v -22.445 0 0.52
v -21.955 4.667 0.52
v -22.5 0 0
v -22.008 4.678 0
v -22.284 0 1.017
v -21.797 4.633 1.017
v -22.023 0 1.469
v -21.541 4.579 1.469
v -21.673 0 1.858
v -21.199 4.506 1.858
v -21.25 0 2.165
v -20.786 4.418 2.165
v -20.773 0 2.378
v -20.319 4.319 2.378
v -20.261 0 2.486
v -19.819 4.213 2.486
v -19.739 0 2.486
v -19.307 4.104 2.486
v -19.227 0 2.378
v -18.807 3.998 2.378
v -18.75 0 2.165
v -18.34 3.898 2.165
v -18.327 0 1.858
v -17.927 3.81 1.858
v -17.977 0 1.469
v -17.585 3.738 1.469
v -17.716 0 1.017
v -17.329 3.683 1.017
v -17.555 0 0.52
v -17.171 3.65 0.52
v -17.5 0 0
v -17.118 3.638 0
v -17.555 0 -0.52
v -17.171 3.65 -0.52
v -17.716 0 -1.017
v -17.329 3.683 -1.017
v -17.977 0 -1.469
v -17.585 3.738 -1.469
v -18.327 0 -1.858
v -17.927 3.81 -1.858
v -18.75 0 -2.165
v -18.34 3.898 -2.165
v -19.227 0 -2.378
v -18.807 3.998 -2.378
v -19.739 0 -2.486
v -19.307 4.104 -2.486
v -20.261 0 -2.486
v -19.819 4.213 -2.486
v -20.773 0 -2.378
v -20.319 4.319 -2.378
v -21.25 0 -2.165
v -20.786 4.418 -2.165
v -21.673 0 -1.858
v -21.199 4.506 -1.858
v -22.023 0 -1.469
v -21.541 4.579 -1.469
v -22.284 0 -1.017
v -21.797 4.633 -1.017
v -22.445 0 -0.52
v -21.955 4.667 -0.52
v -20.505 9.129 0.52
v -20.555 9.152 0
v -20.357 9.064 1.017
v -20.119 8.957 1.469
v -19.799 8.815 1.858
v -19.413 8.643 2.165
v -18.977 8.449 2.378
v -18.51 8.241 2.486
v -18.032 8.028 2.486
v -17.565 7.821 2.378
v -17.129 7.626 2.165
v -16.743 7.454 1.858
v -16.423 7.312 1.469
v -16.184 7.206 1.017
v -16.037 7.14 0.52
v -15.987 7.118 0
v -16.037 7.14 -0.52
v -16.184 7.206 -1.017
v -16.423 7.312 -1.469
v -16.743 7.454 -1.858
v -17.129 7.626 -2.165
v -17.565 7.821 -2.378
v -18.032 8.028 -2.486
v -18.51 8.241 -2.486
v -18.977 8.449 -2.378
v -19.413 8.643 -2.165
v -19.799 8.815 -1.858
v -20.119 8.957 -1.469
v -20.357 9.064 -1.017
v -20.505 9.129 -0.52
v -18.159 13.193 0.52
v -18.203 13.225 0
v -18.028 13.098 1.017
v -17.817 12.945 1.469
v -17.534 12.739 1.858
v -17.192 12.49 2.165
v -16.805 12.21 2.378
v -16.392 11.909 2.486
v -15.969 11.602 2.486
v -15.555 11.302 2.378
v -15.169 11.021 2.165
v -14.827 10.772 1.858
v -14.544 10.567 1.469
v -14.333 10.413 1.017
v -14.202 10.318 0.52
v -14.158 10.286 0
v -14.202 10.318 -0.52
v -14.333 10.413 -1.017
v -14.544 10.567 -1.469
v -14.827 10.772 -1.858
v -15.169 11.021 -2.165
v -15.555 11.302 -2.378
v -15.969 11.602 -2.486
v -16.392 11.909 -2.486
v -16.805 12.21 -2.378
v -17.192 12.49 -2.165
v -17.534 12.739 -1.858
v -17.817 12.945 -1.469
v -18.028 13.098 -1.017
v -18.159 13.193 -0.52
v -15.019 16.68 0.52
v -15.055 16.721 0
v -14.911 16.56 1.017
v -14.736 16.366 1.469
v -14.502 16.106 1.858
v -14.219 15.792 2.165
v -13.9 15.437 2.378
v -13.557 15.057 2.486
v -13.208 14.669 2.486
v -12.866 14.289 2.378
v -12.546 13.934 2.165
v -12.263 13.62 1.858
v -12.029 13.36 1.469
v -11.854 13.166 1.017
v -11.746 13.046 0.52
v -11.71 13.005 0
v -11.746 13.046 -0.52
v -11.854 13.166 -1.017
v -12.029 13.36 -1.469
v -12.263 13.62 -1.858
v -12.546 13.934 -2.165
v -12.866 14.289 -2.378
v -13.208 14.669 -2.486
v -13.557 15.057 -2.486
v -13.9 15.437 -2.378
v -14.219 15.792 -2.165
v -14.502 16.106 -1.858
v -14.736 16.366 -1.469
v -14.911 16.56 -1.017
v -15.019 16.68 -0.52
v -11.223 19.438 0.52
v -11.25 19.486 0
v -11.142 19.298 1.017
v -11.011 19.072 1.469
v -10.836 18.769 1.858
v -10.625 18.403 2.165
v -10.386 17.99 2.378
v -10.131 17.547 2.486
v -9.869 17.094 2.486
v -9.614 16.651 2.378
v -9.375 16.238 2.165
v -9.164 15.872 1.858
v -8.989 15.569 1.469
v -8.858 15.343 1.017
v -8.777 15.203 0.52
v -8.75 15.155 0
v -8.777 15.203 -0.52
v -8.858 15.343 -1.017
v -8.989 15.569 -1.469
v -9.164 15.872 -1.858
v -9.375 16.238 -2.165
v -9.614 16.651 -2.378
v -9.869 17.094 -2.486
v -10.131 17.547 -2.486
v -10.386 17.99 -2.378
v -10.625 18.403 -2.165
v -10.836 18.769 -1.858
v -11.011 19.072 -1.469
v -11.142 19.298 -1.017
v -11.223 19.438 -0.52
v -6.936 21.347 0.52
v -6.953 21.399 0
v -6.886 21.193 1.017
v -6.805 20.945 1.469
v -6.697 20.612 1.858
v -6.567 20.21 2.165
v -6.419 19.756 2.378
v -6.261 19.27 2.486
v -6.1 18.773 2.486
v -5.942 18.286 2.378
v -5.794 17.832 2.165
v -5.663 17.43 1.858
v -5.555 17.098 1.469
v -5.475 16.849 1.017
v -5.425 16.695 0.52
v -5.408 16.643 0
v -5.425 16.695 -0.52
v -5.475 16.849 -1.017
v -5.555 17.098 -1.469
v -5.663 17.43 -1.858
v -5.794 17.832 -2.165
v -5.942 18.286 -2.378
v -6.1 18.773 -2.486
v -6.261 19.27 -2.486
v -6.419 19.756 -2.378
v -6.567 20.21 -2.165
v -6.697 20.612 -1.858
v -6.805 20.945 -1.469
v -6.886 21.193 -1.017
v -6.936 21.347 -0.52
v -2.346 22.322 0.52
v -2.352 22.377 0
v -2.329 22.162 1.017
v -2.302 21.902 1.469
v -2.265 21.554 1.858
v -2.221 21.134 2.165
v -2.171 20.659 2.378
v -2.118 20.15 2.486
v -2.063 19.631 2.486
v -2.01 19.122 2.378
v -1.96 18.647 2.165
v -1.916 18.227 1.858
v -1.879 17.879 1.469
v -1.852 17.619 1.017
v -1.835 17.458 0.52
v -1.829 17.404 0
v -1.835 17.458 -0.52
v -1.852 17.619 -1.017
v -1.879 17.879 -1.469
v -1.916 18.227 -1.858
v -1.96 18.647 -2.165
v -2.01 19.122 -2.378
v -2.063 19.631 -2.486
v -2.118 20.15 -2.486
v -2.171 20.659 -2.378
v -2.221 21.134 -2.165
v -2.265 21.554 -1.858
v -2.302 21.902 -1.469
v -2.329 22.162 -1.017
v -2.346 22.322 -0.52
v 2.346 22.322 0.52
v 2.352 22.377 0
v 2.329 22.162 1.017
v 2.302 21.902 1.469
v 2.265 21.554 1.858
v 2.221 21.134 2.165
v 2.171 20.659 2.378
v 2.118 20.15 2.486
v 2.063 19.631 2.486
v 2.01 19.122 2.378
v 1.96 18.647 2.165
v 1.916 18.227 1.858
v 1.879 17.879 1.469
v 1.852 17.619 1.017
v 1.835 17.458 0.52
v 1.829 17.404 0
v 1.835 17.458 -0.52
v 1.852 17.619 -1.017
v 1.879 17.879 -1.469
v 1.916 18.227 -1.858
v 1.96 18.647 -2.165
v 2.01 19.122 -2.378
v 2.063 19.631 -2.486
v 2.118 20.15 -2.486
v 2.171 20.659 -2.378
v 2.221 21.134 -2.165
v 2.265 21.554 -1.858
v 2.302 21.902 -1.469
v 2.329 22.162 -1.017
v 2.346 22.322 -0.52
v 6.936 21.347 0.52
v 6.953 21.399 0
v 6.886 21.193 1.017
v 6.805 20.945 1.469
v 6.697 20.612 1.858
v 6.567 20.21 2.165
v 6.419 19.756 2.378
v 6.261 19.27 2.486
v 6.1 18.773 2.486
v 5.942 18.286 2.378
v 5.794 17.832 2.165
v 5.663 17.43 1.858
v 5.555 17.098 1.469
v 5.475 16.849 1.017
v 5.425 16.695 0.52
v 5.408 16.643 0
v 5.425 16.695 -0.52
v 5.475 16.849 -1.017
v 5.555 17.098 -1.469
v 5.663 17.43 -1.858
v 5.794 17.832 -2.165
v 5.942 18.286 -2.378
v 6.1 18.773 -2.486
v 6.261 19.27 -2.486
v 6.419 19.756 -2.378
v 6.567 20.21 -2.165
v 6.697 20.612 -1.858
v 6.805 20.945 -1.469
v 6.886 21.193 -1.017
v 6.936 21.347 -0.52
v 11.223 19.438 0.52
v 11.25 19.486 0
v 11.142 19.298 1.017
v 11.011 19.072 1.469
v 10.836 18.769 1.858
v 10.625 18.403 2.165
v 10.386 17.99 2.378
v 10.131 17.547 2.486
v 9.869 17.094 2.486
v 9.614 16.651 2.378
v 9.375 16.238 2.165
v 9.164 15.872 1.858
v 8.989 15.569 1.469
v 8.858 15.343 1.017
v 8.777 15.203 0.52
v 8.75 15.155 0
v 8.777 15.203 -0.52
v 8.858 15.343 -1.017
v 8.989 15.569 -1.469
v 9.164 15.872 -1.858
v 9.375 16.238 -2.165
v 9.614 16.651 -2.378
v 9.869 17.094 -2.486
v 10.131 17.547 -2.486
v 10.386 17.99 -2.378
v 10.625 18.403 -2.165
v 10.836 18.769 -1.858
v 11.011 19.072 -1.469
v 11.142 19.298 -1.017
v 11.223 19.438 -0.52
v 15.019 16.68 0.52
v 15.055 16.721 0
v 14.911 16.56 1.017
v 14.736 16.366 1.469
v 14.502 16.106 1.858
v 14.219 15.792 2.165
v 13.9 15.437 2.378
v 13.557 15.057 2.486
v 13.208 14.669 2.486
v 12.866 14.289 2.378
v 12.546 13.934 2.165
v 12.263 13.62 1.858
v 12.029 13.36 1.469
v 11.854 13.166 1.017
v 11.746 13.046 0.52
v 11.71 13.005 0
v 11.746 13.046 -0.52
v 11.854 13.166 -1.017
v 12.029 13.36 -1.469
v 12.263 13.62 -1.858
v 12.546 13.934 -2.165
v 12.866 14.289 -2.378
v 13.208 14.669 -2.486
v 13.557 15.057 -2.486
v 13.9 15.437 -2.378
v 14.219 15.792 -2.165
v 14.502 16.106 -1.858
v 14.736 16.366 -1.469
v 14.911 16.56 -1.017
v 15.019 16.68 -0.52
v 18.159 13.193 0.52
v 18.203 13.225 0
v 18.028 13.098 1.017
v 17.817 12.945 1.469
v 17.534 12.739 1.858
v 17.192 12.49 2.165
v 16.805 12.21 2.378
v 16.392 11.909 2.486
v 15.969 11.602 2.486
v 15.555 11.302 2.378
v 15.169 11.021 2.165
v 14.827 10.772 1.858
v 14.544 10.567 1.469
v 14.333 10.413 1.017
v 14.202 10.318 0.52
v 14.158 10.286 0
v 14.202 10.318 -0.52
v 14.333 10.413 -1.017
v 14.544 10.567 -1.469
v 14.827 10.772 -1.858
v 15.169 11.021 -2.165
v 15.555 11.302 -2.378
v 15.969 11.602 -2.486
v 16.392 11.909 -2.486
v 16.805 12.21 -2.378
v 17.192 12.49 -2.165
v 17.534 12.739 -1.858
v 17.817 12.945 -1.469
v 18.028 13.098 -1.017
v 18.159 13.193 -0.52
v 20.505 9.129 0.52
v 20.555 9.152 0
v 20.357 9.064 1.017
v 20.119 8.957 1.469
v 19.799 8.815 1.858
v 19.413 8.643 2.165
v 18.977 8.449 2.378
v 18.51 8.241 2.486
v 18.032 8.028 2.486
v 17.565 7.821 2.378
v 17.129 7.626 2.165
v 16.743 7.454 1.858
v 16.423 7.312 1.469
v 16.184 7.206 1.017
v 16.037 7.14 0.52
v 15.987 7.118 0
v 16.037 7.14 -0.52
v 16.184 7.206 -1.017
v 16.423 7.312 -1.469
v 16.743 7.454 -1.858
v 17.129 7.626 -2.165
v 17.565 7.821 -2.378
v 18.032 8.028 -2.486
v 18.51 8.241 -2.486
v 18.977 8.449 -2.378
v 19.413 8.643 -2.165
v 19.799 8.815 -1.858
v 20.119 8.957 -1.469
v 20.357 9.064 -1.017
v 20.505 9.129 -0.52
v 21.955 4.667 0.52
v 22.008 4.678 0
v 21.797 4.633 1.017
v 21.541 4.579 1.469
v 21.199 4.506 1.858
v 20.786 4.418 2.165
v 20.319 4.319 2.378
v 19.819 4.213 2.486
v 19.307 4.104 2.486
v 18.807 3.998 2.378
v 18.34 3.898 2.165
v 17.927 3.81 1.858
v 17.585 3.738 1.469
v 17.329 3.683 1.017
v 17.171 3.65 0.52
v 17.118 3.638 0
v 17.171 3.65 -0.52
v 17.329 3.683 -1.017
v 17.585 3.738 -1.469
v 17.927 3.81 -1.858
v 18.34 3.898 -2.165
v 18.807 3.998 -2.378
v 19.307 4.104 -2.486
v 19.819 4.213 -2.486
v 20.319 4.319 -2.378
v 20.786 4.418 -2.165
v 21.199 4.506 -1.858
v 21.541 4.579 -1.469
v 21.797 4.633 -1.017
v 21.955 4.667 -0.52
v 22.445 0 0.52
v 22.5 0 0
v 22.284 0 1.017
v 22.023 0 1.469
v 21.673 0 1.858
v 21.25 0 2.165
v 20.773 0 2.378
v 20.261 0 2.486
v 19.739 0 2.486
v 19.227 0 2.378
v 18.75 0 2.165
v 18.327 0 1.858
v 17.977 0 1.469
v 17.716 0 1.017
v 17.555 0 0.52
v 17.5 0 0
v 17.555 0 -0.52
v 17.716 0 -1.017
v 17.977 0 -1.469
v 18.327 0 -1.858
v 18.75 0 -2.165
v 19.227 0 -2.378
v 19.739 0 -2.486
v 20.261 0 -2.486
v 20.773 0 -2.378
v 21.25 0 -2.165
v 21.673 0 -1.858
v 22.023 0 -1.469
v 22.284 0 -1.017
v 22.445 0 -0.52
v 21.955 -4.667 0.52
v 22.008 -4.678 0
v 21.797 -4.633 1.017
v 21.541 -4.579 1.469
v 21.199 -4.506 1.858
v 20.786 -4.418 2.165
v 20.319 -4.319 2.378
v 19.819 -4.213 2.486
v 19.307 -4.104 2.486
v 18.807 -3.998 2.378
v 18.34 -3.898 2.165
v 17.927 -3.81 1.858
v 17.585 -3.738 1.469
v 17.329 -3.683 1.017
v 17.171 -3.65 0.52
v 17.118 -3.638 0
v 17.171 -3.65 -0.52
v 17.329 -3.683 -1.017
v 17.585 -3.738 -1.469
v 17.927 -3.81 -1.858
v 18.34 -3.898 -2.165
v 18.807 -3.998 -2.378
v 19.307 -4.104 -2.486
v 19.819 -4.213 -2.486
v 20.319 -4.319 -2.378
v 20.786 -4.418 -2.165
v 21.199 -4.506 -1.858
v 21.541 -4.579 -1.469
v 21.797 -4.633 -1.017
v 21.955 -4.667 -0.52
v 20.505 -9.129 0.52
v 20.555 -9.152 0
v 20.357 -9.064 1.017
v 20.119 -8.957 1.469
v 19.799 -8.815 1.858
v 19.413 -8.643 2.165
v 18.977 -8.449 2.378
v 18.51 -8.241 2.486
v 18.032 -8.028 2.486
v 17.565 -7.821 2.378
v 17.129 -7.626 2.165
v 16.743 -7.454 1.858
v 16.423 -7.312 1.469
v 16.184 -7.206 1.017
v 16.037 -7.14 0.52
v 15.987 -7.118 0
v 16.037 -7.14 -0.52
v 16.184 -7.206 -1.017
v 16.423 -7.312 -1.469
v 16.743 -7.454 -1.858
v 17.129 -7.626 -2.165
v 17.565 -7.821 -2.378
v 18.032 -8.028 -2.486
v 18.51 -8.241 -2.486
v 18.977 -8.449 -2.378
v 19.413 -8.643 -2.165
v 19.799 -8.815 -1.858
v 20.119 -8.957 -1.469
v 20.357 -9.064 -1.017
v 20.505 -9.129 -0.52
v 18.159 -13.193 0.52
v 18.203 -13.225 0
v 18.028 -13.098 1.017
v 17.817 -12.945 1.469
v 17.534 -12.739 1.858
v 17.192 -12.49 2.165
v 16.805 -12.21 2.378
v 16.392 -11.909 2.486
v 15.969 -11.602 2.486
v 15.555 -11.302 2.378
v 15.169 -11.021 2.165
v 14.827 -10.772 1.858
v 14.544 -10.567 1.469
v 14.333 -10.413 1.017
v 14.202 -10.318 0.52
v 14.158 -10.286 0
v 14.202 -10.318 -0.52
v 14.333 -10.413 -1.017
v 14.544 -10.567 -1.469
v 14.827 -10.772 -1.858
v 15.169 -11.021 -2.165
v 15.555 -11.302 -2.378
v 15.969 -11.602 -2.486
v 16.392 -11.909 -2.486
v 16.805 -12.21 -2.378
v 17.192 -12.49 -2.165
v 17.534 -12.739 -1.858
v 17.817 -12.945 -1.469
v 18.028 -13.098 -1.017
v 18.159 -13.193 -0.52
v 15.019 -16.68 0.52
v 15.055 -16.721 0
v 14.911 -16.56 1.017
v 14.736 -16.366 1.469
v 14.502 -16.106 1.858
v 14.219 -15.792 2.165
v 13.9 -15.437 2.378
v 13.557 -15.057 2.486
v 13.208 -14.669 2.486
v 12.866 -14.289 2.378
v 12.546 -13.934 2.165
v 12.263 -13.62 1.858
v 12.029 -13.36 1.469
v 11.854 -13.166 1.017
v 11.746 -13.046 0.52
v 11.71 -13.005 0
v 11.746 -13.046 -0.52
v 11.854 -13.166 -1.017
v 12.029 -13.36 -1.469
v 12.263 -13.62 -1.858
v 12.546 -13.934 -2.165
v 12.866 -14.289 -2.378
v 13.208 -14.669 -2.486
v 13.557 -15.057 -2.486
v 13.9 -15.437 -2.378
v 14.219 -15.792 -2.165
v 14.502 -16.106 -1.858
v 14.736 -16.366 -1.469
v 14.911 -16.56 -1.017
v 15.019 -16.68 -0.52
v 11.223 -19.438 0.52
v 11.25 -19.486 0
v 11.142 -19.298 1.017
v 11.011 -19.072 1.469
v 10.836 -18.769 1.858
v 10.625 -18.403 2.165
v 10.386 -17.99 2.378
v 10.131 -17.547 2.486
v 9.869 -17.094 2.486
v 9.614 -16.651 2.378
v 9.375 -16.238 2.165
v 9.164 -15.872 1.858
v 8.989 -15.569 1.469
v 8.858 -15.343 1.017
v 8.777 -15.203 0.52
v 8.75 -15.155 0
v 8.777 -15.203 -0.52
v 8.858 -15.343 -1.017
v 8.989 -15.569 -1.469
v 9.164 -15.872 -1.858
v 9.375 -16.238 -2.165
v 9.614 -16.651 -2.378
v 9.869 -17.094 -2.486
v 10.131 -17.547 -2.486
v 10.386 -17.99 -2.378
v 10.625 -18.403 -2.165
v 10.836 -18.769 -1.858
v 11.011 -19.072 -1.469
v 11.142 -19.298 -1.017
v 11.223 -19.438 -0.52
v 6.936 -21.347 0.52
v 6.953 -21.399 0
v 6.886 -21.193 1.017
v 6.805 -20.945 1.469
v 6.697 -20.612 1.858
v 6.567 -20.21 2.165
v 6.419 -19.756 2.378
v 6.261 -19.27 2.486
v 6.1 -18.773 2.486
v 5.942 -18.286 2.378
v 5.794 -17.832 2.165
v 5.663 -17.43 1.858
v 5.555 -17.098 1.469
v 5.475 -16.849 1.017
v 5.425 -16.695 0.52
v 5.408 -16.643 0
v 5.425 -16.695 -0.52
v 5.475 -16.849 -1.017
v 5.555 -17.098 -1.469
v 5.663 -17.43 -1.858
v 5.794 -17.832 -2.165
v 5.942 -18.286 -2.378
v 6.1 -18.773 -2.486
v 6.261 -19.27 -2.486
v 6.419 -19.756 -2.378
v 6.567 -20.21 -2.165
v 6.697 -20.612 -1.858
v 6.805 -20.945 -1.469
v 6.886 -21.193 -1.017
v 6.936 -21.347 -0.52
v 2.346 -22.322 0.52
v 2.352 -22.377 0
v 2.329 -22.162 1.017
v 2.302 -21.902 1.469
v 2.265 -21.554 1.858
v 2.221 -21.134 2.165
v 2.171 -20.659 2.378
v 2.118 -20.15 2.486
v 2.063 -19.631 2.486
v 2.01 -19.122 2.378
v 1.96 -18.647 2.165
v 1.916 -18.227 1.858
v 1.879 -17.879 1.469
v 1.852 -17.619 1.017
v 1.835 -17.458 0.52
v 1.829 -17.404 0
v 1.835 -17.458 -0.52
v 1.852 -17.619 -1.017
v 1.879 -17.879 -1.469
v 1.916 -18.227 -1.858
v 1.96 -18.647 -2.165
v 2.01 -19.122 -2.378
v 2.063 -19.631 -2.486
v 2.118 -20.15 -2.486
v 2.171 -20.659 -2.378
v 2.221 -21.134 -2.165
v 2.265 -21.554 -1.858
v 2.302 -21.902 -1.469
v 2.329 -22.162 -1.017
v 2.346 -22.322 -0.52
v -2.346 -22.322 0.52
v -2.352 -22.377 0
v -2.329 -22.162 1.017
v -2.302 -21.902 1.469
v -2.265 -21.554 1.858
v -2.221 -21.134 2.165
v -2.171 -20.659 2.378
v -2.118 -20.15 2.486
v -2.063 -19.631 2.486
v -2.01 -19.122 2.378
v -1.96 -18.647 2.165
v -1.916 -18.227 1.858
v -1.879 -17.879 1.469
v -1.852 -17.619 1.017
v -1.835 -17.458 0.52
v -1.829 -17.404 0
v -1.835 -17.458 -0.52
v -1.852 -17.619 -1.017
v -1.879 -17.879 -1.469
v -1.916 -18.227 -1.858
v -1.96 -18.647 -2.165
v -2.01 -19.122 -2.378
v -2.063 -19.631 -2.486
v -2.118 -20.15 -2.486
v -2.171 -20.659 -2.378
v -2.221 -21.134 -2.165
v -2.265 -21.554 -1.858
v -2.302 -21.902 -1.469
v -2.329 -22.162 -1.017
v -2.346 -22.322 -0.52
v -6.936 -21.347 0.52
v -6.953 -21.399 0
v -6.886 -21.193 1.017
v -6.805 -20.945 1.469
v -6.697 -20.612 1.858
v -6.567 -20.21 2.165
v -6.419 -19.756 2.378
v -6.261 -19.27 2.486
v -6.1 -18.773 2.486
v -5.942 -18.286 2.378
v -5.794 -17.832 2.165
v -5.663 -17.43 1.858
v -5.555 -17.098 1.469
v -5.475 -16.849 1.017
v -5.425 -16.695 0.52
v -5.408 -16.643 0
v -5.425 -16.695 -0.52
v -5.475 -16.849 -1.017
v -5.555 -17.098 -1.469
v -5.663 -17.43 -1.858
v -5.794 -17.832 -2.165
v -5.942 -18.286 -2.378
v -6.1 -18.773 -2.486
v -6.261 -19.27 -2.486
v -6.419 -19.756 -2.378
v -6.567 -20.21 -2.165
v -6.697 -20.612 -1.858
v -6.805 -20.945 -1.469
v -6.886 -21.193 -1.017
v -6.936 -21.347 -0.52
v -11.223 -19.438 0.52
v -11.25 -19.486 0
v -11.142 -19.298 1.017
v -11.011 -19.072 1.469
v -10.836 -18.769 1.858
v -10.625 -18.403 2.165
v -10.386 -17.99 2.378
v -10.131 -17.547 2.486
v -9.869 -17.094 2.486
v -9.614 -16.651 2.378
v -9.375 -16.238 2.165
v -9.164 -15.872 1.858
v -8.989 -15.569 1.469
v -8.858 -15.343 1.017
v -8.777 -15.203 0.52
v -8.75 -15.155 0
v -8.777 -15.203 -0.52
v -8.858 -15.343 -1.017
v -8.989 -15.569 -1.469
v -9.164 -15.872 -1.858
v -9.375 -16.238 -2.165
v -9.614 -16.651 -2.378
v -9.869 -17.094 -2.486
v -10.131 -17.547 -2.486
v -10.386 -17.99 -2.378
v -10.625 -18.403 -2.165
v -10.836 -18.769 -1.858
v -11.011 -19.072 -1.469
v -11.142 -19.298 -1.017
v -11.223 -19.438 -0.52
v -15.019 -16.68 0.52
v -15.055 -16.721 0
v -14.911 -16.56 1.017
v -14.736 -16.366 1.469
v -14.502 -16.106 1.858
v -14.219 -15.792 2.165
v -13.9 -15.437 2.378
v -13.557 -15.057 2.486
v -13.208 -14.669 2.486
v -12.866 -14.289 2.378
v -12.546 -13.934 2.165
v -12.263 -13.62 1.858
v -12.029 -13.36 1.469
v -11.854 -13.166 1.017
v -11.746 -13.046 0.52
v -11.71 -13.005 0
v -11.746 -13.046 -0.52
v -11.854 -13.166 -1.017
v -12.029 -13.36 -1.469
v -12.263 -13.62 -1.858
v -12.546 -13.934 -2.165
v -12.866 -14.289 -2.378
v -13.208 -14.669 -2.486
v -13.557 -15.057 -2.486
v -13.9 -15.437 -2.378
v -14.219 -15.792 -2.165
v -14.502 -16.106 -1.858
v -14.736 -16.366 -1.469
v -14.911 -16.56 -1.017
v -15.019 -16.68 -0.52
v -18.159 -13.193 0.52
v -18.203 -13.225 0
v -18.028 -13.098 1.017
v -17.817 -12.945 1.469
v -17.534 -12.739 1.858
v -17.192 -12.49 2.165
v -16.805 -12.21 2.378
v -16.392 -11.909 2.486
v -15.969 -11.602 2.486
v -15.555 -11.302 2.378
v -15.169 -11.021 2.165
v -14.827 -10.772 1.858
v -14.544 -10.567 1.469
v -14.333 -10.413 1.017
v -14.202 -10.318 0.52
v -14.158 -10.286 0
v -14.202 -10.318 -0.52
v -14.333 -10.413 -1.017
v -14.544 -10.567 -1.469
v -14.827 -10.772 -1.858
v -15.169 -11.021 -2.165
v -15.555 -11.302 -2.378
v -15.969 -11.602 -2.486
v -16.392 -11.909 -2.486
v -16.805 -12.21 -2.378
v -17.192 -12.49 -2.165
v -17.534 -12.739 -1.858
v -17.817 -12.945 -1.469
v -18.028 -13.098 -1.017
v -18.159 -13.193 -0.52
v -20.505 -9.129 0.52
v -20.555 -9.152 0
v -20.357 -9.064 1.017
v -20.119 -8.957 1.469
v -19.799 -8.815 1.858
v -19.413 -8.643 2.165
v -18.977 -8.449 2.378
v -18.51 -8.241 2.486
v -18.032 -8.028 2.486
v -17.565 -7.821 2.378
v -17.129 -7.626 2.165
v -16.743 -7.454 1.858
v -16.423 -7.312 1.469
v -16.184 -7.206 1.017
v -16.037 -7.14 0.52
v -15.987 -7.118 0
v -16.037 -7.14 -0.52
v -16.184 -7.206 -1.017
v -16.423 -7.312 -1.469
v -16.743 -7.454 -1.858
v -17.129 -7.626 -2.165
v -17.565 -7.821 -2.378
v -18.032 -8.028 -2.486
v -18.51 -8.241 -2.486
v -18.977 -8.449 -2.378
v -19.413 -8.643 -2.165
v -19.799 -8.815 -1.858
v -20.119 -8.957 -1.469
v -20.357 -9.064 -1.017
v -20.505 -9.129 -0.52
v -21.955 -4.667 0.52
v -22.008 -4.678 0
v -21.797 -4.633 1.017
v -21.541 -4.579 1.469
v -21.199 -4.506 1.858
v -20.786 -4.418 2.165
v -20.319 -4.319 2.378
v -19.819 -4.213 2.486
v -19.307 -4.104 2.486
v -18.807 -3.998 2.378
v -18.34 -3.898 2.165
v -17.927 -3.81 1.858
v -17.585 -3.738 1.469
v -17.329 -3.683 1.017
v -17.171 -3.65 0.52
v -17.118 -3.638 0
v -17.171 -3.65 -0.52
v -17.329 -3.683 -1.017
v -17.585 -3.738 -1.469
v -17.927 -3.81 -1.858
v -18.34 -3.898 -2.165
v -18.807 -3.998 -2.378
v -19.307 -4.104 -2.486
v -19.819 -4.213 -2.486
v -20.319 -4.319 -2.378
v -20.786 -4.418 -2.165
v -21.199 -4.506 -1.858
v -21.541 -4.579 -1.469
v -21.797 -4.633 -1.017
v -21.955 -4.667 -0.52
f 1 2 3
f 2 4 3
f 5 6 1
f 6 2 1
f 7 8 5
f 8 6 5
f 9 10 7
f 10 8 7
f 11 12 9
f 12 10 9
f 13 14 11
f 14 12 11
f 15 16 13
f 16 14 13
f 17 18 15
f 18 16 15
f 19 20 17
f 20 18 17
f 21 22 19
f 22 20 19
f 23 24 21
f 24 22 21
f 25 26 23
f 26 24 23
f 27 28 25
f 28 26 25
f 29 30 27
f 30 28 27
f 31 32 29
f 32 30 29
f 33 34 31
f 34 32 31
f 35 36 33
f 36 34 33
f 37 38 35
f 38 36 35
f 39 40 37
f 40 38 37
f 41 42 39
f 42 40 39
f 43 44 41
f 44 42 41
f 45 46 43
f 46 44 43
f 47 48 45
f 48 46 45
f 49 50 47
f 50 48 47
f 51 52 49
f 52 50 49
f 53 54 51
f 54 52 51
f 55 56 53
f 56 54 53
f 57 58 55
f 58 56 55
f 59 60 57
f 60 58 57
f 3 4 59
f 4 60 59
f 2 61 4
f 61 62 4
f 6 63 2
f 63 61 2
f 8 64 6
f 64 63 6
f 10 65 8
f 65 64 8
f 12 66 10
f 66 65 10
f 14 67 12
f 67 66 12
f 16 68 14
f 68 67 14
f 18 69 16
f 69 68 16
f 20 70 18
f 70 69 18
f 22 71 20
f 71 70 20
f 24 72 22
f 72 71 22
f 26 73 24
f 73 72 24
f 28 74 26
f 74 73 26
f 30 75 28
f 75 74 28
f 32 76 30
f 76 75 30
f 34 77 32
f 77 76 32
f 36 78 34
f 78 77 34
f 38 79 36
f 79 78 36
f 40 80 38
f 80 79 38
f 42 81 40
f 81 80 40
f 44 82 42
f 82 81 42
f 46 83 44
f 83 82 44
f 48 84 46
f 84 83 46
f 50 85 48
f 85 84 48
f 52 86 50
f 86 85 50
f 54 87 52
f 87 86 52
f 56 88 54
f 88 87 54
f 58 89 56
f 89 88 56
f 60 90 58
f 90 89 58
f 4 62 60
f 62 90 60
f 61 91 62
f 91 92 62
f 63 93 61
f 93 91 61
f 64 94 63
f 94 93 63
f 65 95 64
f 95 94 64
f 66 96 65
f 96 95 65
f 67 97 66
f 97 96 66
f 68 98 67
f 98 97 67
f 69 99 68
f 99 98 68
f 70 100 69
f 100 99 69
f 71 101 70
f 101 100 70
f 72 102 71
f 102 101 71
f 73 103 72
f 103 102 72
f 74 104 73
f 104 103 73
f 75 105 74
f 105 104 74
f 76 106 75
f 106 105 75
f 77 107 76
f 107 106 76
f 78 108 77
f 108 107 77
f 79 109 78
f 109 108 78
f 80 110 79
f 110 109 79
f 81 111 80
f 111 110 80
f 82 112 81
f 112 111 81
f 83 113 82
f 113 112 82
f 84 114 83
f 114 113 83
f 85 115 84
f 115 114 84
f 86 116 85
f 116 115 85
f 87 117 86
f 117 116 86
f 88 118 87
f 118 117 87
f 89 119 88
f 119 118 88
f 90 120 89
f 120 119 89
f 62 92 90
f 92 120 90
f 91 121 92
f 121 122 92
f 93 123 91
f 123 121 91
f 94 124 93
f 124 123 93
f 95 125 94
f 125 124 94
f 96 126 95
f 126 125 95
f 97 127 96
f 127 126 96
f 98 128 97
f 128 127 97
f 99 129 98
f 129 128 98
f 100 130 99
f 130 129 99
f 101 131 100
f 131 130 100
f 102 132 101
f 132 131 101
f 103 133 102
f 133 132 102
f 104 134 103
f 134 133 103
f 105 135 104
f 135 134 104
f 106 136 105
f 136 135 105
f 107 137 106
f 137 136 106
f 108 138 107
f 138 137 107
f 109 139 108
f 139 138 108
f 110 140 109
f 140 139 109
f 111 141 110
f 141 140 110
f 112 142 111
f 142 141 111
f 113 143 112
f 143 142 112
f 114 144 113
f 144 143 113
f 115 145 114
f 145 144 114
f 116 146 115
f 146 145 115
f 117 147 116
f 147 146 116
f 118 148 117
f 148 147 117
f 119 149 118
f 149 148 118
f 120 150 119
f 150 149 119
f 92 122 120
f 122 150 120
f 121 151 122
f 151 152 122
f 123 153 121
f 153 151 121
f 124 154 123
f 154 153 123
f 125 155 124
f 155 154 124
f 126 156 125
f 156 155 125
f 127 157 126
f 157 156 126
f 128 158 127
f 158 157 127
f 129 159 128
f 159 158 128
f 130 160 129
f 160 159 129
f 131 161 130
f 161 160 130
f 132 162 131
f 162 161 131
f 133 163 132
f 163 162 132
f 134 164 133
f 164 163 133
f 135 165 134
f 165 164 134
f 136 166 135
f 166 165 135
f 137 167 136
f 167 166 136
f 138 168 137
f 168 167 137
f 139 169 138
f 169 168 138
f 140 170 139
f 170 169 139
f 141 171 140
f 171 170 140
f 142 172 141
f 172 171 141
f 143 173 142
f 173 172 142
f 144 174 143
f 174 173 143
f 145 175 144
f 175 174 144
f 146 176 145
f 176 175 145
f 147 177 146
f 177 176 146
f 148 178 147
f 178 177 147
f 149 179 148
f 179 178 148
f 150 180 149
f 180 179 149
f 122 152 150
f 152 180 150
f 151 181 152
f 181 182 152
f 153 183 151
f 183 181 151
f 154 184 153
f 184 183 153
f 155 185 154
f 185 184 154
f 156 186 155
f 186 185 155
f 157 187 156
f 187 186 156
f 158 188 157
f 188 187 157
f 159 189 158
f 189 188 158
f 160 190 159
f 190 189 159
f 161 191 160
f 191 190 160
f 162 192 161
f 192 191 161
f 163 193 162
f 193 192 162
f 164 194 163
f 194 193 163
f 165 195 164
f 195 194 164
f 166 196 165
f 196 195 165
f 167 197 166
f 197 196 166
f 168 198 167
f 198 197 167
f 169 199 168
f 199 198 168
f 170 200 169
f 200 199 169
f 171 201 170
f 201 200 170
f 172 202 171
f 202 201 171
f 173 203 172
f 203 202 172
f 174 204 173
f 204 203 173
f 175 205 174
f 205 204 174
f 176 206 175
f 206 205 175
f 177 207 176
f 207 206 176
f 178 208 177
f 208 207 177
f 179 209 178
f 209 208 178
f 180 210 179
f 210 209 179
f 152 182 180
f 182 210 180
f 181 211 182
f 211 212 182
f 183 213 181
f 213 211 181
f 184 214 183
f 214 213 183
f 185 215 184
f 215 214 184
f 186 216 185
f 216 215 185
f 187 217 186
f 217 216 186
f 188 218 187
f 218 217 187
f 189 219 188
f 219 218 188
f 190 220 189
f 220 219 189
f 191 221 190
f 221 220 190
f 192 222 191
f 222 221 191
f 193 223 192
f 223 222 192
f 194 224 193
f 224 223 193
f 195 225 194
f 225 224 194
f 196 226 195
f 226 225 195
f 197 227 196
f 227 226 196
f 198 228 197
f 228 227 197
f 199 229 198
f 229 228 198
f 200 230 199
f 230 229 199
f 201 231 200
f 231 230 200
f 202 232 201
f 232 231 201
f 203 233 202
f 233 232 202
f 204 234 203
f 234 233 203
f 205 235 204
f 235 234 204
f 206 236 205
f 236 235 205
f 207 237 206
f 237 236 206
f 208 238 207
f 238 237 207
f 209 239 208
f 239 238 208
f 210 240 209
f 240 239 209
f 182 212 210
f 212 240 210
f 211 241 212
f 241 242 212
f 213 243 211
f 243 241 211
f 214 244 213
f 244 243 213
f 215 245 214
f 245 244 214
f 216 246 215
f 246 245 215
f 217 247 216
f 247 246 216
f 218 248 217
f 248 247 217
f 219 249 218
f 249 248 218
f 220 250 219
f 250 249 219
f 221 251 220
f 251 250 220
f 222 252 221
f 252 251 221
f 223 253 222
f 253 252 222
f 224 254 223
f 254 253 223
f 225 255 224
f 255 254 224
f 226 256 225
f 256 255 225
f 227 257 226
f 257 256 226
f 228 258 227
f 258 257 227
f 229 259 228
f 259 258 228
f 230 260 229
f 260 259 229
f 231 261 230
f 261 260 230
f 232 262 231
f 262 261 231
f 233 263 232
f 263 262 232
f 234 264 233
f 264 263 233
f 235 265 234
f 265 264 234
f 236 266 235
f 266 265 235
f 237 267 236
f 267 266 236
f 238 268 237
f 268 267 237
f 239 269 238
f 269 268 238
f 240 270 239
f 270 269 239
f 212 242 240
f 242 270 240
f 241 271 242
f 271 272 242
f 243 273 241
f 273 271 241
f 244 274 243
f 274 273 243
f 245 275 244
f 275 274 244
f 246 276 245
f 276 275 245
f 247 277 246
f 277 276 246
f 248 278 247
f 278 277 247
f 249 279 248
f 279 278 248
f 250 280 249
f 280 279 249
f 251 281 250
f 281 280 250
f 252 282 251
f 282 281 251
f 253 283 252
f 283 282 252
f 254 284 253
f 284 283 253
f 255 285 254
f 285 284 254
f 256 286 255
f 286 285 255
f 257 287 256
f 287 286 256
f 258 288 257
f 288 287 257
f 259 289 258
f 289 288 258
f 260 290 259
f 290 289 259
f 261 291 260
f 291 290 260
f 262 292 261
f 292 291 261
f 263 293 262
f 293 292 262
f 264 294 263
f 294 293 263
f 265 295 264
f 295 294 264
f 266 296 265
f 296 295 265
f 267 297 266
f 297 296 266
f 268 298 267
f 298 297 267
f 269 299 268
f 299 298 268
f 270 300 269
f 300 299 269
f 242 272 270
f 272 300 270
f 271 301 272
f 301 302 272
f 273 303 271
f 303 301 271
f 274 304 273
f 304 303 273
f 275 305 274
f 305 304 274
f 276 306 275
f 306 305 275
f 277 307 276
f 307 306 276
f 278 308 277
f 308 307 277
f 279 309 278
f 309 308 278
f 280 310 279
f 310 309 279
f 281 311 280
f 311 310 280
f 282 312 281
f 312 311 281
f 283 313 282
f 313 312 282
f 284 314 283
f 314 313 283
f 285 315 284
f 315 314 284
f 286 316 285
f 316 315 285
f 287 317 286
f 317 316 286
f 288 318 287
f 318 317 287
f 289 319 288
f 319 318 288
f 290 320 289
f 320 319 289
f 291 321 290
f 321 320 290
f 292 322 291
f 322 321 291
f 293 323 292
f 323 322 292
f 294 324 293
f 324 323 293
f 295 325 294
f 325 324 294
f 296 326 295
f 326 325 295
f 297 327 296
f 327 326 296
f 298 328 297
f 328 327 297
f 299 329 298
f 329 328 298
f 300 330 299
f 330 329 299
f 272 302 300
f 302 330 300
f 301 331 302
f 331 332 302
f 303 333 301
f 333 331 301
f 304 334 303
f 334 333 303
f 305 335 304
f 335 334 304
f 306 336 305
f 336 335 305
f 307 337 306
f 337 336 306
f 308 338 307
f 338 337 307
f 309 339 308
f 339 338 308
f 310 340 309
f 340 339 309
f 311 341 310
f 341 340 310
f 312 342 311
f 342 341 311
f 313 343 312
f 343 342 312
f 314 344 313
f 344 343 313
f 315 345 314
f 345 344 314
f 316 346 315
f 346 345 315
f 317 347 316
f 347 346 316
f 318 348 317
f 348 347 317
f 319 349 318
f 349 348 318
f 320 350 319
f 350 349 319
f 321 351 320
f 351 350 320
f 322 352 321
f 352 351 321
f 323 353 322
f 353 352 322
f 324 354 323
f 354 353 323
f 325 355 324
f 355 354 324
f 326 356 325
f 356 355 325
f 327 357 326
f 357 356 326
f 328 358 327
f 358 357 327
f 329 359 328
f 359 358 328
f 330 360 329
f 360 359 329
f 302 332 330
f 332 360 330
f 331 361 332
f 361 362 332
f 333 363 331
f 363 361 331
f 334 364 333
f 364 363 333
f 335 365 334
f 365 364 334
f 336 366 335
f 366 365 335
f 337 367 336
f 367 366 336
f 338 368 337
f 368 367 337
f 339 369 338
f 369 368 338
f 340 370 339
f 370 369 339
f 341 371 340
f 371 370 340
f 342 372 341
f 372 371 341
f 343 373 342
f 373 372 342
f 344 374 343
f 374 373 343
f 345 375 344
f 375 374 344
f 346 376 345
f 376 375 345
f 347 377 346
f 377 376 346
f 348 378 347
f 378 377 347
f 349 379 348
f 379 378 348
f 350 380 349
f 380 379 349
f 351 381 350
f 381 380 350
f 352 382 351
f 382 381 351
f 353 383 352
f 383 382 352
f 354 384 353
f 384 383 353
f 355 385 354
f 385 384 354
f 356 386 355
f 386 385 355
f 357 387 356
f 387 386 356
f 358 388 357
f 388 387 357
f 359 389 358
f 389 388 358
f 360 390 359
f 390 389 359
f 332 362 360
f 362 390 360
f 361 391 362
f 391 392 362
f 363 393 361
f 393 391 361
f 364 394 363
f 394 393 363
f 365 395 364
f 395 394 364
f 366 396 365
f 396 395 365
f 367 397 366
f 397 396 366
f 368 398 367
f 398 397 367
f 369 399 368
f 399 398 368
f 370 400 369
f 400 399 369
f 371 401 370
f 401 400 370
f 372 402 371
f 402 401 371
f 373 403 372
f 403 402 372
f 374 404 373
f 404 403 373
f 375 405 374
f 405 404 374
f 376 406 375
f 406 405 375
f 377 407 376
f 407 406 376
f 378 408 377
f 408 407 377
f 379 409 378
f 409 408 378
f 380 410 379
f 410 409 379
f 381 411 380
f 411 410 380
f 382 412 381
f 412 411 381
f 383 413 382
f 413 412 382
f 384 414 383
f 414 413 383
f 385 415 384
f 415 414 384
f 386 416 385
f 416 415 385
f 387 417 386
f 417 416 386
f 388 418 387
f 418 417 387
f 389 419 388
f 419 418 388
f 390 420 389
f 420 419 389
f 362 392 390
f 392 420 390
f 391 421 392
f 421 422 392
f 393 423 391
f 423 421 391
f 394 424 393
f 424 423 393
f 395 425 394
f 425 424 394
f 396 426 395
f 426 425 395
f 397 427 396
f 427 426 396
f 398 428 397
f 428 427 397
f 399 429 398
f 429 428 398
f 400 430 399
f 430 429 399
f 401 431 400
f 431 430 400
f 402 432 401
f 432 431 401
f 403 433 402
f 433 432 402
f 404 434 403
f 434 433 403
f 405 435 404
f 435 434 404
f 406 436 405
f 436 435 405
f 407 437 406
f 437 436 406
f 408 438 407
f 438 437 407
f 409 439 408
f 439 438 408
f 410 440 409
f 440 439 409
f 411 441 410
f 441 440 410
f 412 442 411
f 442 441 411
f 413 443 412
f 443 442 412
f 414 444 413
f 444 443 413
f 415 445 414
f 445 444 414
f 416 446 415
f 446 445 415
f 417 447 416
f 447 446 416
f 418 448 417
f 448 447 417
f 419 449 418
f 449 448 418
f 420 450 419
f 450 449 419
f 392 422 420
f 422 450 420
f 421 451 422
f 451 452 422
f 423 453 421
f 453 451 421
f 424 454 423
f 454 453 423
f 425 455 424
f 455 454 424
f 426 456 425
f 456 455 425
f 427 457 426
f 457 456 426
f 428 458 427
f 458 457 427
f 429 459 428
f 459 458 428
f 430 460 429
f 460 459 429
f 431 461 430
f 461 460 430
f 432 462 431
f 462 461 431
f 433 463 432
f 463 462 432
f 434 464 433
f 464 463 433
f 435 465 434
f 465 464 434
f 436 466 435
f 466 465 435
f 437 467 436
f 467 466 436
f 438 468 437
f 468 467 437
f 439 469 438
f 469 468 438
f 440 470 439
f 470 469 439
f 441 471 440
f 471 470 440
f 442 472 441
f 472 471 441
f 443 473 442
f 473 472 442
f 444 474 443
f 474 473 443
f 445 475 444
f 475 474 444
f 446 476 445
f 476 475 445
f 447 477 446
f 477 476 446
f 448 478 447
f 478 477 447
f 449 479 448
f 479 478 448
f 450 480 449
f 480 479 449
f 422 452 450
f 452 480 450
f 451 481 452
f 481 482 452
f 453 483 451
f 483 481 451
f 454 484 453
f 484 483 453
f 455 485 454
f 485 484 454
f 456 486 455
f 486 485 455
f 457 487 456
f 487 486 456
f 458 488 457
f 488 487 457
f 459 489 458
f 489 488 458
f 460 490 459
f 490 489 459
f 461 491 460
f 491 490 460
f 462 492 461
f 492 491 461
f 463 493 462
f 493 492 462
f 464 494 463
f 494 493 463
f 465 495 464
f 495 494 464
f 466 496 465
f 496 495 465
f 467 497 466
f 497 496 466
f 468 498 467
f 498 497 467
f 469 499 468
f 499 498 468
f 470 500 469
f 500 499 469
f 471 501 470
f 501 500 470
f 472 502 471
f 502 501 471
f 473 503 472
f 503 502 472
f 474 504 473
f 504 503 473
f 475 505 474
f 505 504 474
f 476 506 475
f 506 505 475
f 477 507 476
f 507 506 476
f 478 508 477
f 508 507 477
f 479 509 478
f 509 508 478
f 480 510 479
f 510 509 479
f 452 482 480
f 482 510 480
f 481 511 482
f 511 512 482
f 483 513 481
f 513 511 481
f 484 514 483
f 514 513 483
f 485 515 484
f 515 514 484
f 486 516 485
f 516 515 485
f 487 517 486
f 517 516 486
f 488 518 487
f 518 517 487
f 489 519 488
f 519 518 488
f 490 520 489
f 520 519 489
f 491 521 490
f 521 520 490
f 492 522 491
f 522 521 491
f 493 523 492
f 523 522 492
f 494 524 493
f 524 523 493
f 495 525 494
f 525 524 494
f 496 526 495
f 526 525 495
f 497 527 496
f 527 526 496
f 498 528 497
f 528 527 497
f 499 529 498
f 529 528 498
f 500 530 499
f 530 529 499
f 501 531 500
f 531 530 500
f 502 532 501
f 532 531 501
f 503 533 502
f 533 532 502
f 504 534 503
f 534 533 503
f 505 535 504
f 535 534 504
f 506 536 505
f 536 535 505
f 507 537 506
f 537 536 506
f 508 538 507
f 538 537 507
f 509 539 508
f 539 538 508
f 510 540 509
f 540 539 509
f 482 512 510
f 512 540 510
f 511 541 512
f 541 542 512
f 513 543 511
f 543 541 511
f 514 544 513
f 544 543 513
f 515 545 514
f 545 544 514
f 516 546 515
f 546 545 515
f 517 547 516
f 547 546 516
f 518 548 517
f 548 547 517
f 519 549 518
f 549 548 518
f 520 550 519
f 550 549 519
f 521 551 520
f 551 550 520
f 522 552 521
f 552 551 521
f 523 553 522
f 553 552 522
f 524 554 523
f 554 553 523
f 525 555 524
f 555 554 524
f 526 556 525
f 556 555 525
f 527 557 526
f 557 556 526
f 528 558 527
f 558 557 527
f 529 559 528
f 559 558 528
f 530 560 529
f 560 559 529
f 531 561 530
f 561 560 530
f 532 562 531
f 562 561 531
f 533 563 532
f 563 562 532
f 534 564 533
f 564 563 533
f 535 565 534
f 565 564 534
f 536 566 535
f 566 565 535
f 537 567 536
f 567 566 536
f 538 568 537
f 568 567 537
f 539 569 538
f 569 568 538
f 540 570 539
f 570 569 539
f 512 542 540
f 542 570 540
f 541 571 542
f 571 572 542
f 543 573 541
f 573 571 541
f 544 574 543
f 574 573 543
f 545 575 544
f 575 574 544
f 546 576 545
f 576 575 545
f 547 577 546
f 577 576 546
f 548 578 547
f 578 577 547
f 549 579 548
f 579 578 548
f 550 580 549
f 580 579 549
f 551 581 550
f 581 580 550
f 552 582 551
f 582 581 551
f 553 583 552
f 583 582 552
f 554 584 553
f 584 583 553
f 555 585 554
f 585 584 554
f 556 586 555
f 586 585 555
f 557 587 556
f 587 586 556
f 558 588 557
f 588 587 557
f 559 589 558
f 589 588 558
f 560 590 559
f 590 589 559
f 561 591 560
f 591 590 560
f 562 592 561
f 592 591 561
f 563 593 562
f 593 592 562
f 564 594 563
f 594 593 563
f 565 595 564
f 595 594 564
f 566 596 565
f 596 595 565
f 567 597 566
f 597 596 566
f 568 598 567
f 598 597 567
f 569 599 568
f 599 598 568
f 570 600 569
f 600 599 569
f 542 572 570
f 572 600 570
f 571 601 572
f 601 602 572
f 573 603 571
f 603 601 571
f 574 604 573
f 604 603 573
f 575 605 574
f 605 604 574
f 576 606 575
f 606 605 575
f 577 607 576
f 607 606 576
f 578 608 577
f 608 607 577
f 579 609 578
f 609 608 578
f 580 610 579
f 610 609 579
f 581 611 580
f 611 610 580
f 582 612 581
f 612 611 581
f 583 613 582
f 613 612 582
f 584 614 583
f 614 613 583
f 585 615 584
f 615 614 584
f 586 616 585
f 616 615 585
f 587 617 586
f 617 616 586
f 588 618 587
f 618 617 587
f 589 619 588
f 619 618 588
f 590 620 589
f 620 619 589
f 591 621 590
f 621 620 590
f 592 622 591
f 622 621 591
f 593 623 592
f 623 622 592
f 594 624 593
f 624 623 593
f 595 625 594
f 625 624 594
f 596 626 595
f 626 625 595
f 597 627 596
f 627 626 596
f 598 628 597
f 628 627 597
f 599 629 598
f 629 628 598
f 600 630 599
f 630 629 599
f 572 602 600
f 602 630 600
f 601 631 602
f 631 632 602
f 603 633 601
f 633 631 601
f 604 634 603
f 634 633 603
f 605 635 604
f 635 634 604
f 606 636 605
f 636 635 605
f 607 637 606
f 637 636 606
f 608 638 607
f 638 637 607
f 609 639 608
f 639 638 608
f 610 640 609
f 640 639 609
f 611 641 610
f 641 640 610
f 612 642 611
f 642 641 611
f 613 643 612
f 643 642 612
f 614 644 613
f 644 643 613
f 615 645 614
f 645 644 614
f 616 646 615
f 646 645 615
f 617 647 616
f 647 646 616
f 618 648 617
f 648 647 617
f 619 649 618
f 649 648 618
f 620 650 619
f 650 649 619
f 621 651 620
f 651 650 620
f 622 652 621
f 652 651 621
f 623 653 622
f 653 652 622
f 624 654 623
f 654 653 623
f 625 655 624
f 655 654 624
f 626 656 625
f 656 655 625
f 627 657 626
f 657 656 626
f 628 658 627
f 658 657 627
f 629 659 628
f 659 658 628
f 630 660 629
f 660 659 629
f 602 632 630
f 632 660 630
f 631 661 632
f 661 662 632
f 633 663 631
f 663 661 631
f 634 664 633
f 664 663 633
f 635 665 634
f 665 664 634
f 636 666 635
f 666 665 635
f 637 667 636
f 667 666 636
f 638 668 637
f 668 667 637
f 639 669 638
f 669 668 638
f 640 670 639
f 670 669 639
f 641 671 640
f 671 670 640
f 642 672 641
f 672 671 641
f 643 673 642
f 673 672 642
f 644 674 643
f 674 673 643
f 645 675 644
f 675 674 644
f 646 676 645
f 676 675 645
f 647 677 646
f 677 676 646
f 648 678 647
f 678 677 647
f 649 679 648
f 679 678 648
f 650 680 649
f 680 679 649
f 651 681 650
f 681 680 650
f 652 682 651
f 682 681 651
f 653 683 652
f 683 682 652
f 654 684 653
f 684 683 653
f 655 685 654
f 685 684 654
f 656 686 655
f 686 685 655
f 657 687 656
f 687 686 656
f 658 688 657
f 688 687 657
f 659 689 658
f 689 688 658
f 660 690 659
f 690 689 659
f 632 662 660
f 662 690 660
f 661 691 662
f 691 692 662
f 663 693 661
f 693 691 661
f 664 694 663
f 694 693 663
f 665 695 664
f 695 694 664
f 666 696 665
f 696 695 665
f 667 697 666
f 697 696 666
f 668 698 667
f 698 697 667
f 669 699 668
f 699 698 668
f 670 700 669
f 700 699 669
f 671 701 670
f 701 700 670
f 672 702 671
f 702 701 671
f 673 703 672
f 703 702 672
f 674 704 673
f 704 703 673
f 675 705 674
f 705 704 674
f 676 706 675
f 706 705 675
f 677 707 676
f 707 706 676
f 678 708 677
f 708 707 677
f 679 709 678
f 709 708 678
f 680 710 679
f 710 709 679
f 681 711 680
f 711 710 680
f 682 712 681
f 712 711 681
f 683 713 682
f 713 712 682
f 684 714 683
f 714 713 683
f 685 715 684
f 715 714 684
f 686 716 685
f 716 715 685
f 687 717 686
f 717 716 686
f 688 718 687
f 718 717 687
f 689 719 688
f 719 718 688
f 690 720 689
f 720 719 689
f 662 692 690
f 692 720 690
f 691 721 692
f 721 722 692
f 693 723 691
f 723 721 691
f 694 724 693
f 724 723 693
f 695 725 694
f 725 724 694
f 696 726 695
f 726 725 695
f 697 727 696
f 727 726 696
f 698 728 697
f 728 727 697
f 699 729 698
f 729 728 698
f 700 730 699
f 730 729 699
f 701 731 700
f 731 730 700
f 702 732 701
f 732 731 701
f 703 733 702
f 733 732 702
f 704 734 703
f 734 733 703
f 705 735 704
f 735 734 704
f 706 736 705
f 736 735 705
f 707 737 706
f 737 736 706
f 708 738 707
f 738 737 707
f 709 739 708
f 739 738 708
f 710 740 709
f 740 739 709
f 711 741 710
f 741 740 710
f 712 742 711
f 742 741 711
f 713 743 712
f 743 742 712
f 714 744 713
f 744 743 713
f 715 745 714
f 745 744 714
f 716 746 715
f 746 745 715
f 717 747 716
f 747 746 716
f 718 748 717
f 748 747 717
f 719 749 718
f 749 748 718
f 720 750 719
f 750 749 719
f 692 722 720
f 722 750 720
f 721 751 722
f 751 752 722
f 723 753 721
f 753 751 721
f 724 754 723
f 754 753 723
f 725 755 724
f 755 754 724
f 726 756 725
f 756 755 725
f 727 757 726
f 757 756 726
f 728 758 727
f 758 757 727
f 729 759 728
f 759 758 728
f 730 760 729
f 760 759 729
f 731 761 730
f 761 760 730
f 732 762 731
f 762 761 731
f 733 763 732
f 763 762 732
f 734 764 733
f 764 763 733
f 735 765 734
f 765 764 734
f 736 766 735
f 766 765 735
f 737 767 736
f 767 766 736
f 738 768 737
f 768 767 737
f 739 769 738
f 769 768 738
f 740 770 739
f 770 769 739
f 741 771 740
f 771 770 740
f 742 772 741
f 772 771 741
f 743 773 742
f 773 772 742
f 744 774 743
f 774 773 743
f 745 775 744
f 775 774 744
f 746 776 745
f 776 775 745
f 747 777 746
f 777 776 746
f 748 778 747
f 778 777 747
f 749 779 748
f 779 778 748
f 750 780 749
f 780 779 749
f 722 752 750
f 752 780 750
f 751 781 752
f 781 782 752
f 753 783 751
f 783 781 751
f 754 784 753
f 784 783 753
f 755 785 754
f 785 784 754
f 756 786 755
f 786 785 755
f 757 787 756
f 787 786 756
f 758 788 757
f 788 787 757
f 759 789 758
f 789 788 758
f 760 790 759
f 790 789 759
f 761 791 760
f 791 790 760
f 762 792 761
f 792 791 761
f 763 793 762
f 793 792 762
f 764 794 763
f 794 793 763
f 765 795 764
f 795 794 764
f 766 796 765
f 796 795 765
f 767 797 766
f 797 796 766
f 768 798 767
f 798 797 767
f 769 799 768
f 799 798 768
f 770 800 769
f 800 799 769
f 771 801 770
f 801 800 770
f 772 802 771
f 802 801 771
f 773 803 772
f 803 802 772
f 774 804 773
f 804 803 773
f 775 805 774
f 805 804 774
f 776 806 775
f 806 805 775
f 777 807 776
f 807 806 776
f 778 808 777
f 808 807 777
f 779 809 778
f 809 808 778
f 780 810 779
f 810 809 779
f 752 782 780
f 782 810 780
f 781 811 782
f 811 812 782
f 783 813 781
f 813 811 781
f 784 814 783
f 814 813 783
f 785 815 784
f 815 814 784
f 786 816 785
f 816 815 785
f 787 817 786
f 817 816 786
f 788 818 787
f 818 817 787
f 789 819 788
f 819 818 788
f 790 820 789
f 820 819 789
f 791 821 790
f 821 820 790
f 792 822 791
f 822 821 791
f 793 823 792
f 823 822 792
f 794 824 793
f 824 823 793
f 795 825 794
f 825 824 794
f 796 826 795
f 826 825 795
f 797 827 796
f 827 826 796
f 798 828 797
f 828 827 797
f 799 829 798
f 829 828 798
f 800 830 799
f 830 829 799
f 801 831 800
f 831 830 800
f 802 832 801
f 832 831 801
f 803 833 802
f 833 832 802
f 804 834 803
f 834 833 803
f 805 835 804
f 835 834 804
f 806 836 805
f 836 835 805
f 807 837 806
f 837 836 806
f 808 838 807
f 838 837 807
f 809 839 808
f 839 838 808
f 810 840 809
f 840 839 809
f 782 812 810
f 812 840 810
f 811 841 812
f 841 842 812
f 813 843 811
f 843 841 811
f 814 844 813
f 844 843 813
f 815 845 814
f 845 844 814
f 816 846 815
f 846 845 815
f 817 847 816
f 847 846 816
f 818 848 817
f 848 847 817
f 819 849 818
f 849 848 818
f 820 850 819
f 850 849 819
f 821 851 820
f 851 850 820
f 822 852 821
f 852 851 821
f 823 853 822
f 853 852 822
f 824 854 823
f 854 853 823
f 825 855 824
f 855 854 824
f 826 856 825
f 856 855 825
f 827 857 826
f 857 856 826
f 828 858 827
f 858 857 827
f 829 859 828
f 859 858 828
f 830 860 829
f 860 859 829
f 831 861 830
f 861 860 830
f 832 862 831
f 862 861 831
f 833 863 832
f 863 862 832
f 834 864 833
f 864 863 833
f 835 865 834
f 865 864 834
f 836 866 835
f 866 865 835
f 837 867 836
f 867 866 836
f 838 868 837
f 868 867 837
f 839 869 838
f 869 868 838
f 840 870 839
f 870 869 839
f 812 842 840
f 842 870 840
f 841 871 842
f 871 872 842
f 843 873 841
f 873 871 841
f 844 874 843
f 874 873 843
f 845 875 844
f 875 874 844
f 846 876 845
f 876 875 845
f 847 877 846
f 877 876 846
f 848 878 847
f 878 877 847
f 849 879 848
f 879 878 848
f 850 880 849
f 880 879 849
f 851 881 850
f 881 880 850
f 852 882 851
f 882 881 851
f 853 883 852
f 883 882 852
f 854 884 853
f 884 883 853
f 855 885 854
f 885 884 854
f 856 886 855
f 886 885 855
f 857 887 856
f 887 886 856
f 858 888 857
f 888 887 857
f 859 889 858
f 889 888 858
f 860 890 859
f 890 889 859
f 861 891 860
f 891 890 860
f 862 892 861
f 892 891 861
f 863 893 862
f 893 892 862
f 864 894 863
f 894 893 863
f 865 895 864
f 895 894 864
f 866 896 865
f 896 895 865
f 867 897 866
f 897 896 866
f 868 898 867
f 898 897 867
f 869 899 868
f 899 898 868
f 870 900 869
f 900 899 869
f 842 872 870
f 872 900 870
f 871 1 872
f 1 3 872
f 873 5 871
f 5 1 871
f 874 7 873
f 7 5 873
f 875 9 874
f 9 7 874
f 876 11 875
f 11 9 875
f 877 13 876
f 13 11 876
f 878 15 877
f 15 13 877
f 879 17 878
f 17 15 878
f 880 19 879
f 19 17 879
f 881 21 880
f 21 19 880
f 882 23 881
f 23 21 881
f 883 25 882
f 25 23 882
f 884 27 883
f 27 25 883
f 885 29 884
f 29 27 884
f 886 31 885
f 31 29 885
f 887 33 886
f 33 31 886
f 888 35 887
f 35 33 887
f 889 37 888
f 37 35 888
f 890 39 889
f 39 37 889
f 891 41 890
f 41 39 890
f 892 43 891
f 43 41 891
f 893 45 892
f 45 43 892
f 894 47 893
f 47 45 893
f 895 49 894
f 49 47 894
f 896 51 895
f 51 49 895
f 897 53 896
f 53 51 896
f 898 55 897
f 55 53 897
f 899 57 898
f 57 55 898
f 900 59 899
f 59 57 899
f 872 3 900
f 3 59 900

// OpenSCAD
rotate_extrude(angle=360) translate([20, 0])circle(d=5, $fn=30);
